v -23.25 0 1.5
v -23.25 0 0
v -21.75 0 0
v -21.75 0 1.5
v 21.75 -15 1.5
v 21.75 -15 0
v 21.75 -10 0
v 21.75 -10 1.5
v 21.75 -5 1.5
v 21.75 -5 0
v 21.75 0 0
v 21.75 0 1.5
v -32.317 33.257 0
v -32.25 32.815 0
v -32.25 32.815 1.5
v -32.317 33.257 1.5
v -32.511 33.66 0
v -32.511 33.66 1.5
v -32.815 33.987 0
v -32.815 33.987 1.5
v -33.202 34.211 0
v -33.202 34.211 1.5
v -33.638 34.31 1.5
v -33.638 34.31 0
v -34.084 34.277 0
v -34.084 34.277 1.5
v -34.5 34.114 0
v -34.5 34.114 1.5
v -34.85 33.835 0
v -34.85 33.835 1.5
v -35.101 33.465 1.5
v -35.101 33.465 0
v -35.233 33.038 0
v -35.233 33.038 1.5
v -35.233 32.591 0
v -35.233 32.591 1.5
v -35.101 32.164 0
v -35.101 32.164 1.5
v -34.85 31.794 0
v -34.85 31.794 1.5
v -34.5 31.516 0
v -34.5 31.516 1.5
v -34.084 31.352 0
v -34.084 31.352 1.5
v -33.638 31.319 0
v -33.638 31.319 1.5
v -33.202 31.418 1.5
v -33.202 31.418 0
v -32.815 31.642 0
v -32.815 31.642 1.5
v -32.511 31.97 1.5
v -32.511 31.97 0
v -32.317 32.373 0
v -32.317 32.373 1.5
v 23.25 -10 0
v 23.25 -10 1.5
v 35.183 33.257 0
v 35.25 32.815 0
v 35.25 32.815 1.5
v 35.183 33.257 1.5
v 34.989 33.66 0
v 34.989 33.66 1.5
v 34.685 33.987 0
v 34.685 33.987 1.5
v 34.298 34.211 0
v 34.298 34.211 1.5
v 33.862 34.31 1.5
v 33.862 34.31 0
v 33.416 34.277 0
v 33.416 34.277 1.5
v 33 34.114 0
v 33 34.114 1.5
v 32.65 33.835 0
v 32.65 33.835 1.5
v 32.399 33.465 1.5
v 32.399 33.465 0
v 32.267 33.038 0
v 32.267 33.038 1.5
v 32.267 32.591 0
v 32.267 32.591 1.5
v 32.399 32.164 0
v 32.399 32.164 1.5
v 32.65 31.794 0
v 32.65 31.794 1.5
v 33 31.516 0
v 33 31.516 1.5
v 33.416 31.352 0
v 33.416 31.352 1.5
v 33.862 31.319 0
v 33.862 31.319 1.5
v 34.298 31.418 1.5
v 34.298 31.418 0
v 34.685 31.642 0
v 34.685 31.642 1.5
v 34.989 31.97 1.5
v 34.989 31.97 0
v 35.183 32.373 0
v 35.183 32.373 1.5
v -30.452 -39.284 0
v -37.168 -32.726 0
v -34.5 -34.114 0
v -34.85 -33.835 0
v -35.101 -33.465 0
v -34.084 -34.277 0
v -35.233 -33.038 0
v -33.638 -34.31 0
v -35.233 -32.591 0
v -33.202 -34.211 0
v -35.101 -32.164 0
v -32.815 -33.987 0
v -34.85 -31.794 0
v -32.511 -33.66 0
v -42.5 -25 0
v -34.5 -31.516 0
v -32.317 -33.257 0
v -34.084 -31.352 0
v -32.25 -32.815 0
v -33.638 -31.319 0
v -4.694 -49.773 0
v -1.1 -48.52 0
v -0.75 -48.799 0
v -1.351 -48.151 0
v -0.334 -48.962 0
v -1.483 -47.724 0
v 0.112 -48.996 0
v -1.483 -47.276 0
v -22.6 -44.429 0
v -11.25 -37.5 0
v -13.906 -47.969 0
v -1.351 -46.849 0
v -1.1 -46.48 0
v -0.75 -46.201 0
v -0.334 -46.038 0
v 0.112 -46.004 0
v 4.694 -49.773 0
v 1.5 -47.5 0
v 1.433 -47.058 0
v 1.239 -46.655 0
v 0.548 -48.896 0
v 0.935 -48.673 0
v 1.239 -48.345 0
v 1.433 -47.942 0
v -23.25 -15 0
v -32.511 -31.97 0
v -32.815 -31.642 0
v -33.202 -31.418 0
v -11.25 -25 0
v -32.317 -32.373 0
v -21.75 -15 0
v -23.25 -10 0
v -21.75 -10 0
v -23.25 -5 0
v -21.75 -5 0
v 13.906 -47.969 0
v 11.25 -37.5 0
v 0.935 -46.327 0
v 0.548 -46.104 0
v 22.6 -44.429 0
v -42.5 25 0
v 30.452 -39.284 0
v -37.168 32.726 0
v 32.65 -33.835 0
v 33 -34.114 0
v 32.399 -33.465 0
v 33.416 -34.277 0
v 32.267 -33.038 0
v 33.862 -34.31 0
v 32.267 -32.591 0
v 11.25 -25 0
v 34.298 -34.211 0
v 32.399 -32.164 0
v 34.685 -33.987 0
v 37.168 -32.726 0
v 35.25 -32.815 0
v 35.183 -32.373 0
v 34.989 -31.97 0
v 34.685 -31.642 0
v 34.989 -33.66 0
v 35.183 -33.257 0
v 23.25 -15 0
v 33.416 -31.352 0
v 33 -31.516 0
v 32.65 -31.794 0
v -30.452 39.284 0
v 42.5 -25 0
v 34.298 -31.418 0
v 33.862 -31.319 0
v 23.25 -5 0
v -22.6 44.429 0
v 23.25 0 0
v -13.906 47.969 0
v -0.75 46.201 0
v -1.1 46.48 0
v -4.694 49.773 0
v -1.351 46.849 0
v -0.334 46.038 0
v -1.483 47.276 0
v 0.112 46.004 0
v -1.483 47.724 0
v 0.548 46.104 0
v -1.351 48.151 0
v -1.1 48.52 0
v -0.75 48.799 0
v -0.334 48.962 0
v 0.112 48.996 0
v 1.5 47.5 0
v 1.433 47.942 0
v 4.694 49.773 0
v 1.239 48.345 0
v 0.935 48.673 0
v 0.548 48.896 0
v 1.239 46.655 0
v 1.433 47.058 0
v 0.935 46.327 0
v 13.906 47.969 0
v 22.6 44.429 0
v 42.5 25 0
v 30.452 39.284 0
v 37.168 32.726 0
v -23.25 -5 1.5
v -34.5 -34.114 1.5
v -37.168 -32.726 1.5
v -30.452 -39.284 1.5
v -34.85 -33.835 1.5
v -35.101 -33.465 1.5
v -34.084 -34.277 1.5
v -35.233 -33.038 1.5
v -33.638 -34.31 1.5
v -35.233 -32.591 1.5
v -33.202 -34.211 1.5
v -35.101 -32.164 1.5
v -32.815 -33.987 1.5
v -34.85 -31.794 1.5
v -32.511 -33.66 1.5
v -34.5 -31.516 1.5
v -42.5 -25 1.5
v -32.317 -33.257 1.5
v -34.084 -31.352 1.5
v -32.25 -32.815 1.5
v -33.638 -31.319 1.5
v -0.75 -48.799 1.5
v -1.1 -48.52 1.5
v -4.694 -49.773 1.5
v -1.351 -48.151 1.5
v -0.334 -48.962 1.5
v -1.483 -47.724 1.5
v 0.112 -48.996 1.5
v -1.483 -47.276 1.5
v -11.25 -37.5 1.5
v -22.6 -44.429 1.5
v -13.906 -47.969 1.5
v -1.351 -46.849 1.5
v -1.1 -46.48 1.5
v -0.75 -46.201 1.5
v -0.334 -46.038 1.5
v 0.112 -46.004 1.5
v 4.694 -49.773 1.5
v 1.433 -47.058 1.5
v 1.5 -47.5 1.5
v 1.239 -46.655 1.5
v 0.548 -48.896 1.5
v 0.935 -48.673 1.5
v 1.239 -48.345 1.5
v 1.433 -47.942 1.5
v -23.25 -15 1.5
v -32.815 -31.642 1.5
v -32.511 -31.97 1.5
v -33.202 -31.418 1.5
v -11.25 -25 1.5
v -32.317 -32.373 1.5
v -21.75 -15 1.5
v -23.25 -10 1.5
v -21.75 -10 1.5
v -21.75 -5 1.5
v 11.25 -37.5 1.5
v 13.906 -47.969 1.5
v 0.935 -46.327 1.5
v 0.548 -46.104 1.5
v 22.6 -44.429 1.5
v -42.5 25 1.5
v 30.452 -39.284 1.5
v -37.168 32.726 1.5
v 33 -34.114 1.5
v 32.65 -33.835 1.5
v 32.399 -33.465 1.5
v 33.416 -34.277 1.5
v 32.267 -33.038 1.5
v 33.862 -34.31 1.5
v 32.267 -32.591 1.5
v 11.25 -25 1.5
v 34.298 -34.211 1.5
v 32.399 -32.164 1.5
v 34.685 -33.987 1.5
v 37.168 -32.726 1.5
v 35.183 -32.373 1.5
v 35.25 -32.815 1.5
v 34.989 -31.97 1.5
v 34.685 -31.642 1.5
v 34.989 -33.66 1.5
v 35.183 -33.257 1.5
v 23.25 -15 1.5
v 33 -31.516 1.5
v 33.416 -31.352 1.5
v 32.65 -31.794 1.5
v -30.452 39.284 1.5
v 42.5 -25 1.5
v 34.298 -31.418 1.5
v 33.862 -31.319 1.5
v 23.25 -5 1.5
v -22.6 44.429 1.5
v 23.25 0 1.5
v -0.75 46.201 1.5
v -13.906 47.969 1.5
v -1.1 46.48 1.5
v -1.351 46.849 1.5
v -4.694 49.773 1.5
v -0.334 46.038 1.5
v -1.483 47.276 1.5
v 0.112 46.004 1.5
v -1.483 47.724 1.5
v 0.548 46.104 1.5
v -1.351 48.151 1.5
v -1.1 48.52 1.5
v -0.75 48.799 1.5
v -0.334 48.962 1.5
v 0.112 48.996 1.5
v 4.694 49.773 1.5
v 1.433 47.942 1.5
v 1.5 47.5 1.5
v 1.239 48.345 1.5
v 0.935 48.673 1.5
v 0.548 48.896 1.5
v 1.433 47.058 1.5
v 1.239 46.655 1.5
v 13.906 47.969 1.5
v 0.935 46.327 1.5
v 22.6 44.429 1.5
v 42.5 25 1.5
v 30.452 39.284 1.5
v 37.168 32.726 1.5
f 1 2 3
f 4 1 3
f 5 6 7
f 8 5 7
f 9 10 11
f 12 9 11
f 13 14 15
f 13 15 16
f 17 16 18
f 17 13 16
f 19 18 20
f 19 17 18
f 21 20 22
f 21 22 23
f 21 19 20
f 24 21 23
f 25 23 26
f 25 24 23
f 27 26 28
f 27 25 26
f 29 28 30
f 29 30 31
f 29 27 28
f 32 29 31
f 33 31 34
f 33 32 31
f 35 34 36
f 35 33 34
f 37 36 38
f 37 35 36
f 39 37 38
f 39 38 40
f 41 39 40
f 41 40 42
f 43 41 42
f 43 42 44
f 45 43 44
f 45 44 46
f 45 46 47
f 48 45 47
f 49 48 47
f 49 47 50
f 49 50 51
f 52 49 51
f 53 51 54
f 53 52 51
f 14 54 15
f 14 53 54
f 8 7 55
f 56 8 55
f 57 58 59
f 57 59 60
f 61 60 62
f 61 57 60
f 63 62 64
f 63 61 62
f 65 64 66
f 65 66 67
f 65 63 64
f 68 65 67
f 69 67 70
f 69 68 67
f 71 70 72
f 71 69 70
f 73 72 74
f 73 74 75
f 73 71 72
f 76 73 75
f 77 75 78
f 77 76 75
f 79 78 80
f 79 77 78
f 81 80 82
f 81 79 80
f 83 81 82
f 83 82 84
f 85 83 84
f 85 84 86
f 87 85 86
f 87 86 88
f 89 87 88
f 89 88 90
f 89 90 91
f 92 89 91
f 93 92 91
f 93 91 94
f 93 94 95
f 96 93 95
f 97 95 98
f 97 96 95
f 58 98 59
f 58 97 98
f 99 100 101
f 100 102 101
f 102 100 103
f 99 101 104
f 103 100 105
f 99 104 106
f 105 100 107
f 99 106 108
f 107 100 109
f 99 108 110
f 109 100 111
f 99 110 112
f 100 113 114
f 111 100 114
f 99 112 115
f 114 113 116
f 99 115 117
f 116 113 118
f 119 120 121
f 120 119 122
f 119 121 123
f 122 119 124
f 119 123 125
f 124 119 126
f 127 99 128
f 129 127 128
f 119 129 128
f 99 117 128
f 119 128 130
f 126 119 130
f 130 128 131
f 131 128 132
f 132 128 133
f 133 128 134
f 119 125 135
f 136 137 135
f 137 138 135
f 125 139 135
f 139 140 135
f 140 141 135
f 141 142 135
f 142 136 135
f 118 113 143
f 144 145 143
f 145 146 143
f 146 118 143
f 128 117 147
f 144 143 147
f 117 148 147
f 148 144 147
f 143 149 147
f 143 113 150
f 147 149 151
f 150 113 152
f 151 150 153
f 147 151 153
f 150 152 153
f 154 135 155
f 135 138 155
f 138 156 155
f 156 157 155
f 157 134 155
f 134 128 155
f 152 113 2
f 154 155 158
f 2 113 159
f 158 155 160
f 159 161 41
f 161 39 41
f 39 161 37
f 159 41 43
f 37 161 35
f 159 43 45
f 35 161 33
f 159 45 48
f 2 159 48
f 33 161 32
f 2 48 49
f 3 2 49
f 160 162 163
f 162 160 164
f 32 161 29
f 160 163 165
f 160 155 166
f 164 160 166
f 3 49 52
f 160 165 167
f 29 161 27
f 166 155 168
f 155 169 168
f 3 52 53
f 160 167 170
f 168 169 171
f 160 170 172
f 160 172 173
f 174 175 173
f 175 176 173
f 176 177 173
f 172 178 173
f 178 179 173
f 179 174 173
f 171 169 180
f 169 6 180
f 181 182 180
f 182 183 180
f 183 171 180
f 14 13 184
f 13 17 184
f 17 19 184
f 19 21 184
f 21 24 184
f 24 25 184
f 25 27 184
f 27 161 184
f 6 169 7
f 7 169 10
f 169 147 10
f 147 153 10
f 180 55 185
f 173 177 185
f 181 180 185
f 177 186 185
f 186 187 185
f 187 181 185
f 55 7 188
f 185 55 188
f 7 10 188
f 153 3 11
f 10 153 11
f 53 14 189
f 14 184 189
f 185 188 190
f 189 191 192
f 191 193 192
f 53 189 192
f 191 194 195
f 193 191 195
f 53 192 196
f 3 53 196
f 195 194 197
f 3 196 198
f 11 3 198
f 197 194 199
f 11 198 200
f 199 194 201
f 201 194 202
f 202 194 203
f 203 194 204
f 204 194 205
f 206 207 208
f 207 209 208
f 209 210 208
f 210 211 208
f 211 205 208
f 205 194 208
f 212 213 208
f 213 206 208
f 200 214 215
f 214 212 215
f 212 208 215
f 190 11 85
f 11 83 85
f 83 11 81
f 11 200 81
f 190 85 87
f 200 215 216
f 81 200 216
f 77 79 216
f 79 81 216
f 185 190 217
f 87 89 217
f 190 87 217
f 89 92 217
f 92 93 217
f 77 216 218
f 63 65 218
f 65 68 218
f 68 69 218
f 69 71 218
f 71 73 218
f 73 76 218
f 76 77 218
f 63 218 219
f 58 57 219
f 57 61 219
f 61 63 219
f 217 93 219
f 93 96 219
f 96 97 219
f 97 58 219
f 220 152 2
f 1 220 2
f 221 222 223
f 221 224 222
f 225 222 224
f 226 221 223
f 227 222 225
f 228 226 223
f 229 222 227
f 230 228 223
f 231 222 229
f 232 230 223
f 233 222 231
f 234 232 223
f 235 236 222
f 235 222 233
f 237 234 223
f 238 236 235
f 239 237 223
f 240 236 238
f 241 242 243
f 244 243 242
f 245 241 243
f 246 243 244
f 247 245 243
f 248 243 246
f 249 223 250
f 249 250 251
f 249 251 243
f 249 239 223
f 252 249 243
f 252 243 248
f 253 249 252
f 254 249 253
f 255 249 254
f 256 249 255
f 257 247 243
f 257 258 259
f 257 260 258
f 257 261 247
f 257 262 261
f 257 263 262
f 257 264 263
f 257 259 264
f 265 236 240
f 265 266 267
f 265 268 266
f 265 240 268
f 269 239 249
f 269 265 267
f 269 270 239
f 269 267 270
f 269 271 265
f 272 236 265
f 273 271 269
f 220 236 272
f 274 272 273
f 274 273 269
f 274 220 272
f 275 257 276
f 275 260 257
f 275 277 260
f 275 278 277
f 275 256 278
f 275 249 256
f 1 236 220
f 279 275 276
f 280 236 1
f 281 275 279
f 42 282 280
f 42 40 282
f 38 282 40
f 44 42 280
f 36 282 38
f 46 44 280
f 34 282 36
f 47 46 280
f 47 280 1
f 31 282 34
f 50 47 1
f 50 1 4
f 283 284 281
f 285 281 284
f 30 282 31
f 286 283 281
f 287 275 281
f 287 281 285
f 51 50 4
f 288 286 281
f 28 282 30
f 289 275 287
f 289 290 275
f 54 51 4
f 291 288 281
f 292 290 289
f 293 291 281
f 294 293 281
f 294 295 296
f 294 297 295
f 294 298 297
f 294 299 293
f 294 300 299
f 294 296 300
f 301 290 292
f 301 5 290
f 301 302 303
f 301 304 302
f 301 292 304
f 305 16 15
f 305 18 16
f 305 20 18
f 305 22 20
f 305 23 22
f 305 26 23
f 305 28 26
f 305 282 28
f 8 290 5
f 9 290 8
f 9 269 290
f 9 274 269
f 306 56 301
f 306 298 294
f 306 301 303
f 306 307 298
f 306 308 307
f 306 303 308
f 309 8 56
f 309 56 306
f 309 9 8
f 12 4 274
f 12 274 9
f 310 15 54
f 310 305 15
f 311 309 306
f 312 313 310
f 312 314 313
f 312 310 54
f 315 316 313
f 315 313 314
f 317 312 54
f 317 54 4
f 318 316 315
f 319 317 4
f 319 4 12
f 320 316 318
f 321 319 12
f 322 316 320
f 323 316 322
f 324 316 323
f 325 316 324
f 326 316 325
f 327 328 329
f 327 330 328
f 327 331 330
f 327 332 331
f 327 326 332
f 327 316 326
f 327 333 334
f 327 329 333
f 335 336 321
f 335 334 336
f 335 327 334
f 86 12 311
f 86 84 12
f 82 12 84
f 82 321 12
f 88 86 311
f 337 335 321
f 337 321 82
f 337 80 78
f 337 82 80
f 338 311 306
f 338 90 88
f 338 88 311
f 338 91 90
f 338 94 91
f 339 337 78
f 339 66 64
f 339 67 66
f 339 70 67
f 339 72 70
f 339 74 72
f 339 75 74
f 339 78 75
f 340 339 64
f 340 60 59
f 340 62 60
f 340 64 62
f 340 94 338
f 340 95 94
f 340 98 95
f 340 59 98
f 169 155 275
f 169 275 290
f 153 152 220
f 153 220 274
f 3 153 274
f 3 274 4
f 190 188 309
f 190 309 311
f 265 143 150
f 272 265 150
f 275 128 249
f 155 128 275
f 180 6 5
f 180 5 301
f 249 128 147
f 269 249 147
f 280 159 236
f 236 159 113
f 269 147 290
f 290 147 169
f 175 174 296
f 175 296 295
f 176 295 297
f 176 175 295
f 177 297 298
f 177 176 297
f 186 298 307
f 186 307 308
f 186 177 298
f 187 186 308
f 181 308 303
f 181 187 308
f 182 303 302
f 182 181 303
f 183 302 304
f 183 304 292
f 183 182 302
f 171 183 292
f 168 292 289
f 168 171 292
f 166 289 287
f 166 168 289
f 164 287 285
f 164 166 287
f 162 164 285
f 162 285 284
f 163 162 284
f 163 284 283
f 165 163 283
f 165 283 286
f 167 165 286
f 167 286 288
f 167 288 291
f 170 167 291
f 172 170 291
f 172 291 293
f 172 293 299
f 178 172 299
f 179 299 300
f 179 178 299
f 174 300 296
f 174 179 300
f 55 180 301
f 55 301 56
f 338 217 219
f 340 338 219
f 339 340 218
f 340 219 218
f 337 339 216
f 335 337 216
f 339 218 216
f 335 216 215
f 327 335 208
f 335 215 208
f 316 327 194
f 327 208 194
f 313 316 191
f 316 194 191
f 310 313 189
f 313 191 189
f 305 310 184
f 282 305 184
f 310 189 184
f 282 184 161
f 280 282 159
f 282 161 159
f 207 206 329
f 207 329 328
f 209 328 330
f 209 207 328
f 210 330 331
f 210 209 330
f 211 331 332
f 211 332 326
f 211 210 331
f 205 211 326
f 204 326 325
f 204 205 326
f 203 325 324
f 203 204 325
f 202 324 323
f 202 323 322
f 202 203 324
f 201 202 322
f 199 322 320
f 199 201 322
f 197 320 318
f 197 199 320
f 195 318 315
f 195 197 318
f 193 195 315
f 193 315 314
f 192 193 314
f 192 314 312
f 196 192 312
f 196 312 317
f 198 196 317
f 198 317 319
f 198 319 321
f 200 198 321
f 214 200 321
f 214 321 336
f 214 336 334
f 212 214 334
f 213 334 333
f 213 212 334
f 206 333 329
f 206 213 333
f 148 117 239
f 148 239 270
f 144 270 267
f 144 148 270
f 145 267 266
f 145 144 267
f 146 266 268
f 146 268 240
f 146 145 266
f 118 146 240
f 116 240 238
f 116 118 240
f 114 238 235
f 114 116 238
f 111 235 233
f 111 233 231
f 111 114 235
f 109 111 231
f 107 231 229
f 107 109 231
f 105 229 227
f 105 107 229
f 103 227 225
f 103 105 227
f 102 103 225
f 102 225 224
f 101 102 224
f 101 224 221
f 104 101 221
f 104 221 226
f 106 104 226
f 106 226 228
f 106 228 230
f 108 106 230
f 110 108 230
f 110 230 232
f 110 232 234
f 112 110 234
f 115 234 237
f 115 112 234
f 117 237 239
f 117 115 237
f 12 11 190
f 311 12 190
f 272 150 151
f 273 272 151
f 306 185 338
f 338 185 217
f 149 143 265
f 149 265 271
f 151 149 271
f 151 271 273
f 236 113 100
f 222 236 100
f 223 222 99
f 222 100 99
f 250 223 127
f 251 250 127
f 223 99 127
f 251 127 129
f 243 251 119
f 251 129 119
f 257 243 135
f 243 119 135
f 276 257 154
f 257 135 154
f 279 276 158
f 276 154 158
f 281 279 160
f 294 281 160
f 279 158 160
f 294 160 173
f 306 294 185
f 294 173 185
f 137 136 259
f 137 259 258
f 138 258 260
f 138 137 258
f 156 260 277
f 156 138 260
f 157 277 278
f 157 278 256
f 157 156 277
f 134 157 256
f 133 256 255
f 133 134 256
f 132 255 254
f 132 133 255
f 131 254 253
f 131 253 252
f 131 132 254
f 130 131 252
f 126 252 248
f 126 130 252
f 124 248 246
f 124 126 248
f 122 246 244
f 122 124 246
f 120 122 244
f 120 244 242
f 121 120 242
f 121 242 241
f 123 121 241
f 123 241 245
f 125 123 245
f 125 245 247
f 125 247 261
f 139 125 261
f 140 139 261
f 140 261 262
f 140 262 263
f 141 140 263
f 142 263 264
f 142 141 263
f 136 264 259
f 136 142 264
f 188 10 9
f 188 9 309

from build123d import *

# Parameters (mm, degrees)
F0_R     = 1.5
F0_W     = 1.5
F0_H     = 5
F0_W_2   = 22.5
F0_H_2   = 12.5
F1_DEPTH = 1.5


with BuildPart() as f1:
    # F0 (on Top) → F1 (new body)
    with BuildSketch(Plane.XY):
        with BuildLine():
            Line((42.5, -25), (42.5, 25))
            ThreePointArc((42.5, 25), (0, 50), (-42.5, 25))
            Line((-42.5, 25), (-42.5, -25))
            ThreePointArc((-42.5, -25), (0, -50), (42.5, -25))
        make_face()
        with Locations((-33.75, -32.814674)):
            Circle(F0_R, mode=Mode.SUBTRACT)
        with Locations((-22.5, -12.5)):
            Rectangle(F0_W, F0_H, mode=Mode.SUBTRACT)
        with Locations((-22.5, -2.5)):
            Rectangle(F0_W, F0_H, mode=Mode.SUBTRACT)
        with Locations((0, -47.5)):
            Circle(F0_R, mode=Mode.SUBTRACT)
        with Locations((0, -31.25)):
            Rectangle(F0_W_2, F0_H_2, mode=Mode.SUBTRACT)
        with Locations((33.75, -32.814674)):
            Circle(F0_R, mode=Mode.SUBTRACT)
        with Locations((22.5, -12.5)):
            Rectangle(F0_W, F0_H, mode=Mode.SUBTRACT)
        with Locations((22.5, -2.5)):
            Rectangle(F0_W, F0_H, mode=Mode.SUBTRACT)
        with Locations((-33.75, 32.814674)):
            Circle(F0_R, mode=Mode.SUBTRACT)
        with Locations((0, 47.5)):
            Circle(F0_R, mode=Mode.SUBTRACT)
        with Locations((33.75, 32.814674)):
            Circle(F0_R, mode=Mode.SUBTRACT)
    extrude(amount=F1_DEPTH)


solid = f1.part
